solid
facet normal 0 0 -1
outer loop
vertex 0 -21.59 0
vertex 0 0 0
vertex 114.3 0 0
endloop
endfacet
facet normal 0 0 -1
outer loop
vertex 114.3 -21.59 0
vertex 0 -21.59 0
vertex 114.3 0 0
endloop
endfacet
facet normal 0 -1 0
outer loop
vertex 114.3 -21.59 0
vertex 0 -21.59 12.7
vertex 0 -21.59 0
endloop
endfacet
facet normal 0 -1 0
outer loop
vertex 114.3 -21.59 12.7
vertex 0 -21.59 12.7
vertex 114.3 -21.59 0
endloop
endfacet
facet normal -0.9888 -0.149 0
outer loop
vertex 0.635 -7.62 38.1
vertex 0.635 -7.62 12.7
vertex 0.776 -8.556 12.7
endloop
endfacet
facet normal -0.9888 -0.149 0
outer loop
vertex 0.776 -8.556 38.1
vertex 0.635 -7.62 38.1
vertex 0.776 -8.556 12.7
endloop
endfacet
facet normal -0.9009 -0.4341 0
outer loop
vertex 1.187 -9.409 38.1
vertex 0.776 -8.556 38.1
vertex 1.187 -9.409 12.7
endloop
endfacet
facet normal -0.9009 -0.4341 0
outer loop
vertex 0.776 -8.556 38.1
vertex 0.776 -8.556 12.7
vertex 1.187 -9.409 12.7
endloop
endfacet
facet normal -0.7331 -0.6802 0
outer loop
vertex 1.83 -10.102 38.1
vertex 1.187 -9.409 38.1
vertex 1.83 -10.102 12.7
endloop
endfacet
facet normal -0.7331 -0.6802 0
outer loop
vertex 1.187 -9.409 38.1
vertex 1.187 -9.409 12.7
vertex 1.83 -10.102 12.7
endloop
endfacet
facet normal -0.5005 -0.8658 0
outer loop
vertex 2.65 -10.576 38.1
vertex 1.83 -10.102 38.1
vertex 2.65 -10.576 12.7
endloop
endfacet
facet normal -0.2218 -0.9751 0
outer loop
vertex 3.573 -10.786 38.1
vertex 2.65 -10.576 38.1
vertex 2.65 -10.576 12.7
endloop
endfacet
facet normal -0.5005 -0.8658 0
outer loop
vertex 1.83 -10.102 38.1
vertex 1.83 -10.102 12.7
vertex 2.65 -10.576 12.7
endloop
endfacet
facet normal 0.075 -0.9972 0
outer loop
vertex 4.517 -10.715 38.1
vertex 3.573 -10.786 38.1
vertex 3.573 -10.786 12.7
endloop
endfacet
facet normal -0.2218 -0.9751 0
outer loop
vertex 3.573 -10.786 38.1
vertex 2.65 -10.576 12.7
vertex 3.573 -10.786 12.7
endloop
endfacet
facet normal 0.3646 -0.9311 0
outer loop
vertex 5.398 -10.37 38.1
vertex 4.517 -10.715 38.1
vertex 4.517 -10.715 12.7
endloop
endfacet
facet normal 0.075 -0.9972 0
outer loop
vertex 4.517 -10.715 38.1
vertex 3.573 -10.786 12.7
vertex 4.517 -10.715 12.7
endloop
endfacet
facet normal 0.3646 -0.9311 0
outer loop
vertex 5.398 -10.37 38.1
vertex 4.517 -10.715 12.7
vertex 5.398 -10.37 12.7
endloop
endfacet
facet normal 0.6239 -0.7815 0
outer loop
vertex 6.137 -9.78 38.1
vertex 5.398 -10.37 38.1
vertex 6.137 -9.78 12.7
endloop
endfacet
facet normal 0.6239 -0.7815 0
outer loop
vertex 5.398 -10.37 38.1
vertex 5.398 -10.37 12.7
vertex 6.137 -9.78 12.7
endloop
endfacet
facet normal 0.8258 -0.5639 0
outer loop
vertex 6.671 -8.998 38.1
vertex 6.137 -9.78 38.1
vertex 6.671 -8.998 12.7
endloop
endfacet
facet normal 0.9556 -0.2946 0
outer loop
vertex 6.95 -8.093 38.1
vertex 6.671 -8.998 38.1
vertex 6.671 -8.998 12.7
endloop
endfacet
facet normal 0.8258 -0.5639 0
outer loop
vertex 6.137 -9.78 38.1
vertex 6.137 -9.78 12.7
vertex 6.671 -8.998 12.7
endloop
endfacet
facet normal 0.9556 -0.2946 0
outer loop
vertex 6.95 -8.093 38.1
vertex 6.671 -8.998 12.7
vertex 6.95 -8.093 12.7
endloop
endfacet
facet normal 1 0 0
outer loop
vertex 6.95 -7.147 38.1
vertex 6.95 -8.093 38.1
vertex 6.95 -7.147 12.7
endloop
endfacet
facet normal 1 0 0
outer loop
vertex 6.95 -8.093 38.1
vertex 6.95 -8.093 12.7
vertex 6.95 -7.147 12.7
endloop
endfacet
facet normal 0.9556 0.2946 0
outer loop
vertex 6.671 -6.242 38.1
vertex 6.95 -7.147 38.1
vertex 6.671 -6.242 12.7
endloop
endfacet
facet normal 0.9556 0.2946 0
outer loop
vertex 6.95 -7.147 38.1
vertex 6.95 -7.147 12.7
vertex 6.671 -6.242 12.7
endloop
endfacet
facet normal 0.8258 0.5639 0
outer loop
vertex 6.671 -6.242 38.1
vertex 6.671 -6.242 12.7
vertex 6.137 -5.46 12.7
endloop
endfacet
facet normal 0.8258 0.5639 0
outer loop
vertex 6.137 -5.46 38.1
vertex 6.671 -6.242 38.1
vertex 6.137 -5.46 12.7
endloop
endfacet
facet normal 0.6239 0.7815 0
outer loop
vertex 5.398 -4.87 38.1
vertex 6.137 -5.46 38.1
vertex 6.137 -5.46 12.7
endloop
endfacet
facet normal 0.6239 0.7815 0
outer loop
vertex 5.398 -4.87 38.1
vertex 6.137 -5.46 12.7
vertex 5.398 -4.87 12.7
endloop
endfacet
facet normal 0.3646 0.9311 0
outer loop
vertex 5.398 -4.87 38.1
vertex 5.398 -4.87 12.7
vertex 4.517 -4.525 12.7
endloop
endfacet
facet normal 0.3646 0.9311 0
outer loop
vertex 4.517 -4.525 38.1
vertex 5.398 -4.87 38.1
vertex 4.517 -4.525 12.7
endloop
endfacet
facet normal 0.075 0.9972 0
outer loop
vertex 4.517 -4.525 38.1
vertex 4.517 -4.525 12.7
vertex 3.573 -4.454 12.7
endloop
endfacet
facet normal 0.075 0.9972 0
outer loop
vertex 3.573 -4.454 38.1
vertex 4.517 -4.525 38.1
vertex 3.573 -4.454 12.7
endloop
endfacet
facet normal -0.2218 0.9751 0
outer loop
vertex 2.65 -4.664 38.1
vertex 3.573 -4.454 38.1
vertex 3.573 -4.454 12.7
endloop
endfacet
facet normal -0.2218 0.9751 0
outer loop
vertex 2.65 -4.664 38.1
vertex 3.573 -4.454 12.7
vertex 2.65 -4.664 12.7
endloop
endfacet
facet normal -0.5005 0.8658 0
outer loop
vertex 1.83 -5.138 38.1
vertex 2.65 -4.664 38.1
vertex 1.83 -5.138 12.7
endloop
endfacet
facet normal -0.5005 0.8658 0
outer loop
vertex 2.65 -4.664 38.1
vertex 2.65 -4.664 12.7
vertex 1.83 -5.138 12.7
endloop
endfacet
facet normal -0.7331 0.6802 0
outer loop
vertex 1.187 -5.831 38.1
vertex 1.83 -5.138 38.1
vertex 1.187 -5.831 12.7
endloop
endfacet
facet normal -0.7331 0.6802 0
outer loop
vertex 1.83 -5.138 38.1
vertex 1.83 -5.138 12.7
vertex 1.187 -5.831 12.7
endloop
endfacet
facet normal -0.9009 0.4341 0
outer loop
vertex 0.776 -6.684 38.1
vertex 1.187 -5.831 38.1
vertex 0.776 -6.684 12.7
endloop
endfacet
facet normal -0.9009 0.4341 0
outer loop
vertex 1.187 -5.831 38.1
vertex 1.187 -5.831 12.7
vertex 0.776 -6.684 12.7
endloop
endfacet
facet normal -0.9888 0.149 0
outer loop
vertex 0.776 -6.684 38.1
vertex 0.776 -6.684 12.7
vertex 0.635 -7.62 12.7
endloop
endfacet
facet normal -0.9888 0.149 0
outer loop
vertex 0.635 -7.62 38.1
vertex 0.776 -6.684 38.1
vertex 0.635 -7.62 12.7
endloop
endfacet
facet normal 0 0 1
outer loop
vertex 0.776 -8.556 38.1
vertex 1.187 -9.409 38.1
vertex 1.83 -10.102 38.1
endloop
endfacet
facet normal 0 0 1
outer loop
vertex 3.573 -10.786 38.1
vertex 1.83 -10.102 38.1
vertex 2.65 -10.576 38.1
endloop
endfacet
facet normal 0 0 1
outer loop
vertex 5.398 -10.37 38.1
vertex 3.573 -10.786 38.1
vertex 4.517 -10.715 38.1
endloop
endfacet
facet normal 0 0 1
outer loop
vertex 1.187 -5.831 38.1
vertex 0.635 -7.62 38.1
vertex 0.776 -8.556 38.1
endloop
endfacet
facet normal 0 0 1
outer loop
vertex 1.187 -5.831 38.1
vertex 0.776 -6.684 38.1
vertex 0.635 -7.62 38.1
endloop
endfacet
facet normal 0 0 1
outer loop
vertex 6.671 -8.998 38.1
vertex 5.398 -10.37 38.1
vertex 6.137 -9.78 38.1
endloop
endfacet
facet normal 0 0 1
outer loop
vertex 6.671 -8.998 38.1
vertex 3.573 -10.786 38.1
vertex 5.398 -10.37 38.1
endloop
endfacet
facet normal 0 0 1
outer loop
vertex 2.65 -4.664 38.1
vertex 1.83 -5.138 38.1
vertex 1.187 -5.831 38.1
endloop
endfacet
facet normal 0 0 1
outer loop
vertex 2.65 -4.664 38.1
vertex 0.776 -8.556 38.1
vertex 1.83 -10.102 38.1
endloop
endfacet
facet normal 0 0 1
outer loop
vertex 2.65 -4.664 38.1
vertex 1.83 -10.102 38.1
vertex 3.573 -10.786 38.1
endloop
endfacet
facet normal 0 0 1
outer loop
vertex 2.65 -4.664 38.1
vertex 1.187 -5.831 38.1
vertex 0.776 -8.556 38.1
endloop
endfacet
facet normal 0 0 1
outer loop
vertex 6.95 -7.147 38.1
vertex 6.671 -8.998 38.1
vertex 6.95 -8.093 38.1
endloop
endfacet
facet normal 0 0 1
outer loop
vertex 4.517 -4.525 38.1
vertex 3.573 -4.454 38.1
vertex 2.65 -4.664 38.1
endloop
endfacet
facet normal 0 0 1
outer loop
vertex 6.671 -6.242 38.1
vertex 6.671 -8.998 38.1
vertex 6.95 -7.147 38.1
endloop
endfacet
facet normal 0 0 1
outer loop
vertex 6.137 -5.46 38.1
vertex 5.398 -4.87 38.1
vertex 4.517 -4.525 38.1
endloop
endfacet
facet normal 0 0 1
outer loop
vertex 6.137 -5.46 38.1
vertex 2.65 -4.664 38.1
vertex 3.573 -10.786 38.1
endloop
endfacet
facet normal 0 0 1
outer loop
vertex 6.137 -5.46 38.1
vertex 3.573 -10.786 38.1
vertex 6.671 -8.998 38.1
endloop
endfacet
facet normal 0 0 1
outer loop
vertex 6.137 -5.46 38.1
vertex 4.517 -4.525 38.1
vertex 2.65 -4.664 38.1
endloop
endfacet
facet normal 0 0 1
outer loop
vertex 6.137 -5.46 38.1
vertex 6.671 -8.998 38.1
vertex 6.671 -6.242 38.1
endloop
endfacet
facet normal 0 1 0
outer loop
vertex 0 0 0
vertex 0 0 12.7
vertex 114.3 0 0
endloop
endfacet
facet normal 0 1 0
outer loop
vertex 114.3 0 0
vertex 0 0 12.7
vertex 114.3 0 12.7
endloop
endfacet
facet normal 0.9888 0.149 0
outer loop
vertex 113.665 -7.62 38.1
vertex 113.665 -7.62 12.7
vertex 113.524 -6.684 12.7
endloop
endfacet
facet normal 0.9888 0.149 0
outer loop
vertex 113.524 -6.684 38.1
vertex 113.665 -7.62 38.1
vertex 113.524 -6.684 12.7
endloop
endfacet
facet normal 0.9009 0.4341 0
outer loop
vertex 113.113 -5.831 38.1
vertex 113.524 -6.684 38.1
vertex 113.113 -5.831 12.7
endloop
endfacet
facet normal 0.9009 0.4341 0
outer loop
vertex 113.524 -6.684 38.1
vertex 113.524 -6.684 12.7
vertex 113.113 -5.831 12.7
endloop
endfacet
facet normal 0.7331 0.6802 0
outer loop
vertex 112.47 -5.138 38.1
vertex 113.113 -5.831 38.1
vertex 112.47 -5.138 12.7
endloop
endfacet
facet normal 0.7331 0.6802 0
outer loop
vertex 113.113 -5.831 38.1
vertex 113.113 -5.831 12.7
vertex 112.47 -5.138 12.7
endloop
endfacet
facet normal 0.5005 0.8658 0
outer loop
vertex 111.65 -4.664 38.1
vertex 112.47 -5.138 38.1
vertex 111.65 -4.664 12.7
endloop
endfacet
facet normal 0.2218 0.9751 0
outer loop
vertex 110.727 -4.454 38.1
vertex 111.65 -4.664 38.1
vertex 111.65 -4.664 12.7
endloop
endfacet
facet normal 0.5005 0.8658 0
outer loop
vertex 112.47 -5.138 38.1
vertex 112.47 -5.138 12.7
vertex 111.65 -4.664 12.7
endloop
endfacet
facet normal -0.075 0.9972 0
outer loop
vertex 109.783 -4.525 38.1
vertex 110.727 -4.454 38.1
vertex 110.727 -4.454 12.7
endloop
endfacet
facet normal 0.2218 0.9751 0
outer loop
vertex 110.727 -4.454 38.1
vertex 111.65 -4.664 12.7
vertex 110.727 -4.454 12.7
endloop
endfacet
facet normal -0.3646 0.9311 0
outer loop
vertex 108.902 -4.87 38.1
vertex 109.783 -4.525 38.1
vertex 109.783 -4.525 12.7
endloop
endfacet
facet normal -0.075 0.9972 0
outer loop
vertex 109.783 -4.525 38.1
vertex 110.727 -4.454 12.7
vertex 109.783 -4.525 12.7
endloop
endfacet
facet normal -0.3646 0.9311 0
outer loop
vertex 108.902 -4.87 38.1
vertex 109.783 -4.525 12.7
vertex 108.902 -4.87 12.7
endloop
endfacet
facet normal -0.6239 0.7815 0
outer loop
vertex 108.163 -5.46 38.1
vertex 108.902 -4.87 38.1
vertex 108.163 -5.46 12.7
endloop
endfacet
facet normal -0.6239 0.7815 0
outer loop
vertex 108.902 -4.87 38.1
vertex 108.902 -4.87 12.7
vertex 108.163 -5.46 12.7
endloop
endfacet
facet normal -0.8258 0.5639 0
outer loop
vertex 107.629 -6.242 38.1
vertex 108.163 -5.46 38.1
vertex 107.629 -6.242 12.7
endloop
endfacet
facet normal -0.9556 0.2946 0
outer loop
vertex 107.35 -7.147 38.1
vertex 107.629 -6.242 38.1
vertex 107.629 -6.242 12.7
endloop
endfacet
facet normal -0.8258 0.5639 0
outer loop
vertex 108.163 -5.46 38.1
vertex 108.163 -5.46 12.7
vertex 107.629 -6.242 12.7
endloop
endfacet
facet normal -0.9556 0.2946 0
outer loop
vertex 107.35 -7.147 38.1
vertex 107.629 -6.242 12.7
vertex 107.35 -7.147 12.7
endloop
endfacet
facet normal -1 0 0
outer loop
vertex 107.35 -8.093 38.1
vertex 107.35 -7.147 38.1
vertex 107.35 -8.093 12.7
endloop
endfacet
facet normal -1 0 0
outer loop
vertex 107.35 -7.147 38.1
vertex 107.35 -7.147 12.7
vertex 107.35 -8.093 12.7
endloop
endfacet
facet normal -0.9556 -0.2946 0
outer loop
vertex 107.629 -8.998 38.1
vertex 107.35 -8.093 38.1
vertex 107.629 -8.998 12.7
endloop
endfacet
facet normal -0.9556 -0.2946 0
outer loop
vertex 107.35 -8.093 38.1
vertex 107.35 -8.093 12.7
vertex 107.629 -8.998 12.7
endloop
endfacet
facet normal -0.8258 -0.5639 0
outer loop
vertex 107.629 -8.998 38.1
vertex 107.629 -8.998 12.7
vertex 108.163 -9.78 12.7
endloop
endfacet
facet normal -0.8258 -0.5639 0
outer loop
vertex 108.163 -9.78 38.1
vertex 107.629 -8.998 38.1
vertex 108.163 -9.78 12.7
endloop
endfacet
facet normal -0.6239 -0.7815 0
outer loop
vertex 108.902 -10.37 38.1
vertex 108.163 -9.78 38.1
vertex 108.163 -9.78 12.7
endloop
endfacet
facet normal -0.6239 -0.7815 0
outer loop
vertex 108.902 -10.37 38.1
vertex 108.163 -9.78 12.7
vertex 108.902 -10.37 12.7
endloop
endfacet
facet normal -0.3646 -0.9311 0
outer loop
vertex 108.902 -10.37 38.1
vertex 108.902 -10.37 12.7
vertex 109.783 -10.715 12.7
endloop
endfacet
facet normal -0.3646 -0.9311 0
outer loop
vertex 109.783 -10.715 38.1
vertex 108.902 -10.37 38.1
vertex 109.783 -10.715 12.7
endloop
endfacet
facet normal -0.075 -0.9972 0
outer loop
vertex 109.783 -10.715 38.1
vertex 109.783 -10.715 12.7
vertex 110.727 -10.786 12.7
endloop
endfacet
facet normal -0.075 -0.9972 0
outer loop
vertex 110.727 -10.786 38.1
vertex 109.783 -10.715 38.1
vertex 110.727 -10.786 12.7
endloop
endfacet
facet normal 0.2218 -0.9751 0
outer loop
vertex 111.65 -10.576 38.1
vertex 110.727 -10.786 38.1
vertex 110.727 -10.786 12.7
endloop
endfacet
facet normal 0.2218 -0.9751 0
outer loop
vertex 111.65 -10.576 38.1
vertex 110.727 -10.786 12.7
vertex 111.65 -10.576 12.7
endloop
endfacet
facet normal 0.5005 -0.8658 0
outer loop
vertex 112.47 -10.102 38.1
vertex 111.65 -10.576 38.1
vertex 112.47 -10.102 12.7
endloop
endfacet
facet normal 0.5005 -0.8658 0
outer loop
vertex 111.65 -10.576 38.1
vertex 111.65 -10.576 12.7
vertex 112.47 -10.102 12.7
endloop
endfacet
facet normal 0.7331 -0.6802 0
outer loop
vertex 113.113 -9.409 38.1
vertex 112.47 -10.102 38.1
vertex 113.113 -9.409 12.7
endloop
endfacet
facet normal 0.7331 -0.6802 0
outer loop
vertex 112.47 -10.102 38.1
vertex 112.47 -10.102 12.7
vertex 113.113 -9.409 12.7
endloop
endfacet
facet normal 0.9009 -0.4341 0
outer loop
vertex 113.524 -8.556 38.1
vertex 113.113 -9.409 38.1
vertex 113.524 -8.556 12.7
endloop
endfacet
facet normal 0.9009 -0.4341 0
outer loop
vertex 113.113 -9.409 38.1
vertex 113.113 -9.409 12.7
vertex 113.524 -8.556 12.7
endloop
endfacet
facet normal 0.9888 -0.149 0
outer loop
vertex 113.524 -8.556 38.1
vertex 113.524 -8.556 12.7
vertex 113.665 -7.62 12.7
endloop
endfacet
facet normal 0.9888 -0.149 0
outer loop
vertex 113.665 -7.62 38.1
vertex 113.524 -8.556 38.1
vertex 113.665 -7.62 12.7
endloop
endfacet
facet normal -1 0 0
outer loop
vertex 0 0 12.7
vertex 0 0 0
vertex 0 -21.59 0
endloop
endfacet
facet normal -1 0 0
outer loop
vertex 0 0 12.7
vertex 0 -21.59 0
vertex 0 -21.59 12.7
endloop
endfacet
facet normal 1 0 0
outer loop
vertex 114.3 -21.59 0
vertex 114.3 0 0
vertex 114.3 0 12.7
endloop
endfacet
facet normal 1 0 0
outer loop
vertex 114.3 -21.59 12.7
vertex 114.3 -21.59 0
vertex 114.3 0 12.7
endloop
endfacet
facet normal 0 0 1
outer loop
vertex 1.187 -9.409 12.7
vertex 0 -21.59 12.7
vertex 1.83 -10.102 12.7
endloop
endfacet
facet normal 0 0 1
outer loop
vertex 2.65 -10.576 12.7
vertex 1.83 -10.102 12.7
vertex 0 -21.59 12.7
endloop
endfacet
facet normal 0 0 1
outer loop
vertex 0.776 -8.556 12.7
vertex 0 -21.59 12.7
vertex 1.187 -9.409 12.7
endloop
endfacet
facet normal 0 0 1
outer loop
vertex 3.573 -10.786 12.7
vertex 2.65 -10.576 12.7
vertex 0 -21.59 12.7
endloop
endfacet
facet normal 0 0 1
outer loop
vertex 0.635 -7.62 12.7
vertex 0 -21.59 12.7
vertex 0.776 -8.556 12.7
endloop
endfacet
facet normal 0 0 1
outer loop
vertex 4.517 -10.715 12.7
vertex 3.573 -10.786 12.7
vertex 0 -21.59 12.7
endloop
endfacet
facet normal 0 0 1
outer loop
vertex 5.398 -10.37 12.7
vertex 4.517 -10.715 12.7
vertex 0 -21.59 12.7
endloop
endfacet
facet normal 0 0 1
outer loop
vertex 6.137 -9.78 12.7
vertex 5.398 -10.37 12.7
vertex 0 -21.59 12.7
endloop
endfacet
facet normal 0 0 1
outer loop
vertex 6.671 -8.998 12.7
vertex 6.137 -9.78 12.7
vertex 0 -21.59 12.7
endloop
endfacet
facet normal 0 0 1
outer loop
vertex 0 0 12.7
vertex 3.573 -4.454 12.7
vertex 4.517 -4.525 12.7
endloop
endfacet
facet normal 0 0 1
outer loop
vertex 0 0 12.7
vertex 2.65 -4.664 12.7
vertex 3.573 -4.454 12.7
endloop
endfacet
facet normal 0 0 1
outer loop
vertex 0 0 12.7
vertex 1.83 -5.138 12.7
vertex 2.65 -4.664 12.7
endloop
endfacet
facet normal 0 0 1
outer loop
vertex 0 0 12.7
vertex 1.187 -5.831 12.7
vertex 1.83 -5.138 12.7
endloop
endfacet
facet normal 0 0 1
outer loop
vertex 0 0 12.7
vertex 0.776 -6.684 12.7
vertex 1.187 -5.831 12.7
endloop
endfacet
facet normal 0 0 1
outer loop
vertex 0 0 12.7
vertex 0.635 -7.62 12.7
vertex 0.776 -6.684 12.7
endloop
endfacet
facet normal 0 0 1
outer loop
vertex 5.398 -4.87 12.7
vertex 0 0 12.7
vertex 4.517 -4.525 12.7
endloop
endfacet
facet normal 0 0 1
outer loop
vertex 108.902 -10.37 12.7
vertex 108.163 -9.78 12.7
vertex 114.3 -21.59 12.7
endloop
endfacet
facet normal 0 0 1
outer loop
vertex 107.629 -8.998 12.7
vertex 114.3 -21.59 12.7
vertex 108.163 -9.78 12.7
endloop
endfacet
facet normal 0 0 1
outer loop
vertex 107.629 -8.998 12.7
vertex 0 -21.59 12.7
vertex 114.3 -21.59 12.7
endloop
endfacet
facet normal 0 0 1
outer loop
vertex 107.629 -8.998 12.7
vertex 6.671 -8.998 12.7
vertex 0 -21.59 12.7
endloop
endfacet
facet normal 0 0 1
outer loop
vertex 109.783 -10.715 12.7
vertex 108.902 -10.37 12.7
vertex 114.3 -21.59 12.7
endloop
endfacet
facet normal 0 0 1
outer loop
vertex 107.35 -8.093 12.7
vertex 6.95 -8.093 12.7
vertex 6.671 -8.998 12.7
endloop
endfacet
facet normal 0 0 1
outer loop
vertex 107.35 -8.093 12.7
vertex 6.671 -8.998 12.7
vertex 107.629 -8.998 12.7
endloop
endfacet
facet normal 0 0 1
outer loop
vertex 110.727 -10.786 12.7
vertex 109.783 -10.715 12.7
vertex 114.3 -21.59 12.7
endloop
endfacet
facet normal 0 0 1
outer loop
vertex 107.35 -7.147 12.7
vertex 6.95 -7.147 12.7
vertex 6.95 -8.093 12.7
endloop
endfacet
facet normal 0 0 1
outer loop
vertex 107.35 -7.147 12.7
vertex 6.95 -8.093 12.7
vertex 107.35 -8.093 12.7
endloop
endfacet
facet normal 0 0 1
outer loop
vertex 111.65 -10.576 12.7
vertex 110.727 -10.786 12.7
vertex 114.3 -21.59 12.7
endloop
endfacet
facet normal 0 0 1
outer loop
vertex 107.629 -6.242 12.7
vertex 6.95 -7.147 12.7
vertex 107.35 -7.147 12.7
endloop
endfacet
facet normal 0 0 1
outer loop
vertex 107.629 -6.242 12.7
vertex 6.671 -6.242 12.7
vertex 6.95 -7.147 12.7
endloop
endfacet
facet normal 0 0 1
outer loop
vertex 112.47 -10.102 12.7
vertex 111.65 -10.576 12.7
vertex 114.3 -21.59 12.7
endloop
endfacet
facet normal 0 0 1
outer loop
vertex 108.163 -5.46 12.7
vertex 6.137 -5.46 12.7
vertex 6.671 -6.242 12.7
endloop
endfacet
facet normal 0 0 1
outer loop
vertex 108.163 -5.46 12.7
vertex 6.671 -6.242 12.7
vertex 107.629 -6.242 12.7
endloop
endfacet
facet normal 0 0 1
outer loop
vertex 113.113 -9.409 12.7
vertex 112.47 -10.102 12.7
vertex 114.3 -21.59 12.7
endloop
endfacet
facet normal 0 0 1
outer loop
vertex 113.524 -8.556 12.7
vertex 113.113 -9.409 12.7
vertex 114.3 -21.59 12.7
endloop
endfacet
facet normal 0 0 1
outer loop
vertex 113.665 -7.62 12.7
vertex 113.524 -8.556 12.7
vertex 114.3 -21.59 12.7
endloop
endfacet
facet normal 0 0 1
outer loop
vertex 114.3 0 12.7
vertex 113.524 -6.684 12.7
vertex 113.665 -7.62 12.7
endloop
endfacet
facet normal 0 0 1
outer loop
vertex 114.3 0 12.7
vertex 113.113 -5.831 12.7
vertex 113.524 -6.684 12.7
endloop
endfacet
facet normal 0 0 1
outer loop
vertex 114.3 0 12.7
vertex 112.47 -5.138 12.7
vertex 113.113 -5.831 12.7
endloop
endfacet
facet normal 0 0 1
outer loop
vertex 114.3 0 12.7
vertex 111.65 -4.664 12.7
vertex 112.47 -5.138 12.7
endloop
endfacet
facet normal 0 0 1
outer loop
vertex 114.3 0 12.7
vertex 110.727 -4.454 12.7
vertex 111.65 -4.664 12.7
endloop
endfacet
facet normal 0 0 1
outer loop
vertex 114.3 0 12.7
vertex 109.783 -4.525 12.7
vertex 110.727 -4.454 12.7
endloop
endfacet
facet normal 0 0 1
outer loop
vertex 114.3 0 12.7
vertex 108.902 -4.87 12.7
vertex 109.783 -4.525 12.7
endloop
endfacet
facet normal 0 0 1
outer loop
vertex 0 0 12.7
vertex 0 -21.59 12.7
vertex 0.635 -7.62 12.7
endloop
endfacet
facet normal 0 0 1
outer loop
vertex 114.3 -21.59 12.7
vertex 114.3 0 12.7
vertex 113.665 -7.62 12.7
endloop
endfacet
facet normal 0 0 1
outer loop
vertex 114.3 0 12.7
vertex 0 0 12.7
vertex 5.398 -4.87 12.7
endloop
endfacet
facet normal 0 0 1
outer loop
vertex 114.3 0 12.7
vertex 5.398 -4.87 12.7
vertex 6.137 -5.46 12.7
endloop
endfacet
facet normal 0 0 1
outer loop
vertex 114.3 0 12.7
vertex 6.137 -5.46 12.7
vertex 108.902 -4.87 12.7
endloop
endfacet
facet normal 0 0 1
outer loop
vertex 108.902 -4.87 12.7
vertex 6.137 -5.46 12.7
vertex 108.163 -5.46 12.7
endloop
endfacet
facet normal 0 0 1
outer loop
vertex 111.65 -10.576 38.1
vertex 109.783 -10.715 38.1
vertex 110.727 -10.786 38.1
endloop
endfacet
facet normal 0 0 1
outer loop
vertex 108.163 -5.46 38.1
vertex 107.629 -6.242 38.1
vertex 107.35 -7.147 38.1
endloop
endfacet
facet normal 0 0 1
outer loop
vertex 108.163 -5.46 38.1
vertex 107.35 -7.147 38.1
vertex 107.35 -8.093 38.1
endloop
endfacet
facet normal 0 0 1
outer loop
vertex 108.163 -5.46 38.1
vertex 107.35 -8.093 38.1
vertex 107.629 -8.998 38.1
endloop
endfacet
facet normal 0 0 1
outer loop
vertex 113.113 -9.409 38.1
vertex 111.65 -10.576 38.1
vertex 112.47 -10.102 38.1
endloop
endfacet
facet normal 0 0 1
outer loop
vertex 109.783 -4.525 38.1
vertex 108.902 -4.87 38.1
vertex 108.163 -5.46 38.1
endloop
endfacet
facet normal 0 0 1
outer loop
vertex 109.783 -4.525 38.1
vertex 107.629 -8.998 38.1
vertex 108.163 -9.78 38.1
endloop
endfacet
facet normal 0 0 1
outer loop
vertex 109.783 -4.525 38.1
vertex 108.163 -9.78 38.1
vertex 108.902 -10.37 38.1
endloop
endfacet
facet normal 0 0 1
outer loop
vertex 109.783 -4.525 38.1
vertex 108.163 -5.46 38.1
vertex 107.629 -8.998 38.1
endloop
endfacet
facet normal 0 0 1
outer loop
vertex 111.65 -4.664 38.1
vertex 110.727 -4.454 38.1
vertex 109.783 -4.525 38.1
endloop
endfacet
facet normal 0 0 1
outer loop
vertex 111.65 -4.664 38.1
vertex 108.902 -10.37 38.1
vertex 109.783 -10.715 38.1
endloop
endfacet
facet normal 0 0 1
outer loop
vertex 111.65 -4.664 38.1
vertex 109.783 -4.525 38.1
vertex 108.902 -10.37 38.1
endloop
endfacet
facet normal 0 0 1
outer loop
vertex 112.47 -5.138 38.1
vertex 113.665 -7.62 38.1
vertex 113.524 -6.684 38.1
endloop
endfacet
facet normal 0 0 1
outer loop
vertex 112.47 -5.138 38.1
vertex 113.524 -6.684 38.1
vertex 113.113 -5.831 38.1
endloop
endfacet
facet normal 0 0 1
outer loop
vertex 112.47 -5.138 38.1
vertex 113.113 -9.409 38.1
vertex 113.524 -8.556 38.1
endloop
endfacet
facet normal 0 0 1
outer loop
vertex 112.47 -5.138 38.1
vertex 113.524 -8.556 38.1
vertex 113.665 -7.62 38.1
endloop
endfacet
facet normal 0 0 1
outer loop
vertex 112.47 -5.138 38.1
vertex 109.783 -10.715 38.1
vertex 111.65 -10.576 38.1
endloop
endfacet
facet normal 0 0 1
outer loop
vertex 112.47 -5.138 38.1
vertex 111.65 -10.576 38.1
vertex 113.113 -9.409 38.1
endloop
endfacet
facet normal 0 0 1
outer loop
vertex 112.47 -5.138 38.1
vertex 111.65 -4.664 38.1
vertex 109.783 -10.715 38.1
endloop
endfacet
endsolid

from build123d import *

# Parameters (mm, degrees)
F0_W     = 114.3
F0_H     = 12.7
F1_DEPTH = 21.59
F3_DEPTH = 25.4
F2_R     = 3.175
F4_DEPTH = 25.4


with BuildPart() as f1:
    # F0 (on Front) → F1 (new body)
    with BuildSketch(Plane.XZ):
        with Locations((57.15, 6.35)):
            Rectangle(F0_W, F0_H)
    extrude(amount=F1_DEPTH)

    # F2 (on face) → F3 (join)
    with BuildSketch(Plane.XY.offset(12.7)):
        with BuildLine():
            ThreePointArc((6.985, -7.62), (3.81, -4.445), (0.635, -7.62))
            ThreePointArc((0.635, -7.62), (3.81, -10.795), (6.985, -7.62))
        make_face()
    extrude(amount=F3_DEPTH)

    # F2 (on face) → F4 (join)
    with BuildSketch(Plane.XY.offset(12.7)):
        with Locations((110.49, -7.62)):
            Circle(F2_R)
    extrude(amount=F4_DEPTH)


solid = f1.part
